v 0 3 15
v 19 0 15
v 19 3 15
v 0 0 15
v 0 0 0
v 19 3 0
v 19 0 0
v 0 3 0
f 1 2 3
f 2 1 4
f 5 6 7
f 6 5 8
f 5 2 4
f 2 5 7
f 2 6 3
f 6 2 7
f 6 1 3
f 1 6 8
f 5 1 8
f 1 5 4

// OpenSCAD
// Generated by SolidPython 1.0.1 on 2020-07-29 00:46:56


cube(size = [19, 3, 15]);
/***********************************************
*********      SolidPython code:      **********
************************************************
 
# import packages: SolidPython
from solid import *
from solid.utils import *
from itertools import chain, combinations, permutations


class Resize:

    def __init__(self, scad_file):
        self.scad_file = scad_file
        #self.scad_file = import_scad(scad_file)
        # cone/cylinder param:
        self.r1 = 0
        self.r2 = 0
        self.h = 0
        # rectangular prism param:
        self.w = 0
        self.l = 0
        # ellipse param:
        self.r = 0

    # import OpenScad code (file name corresponds to shape)


    # classify shape + parameters
    def assign(self, param1, param2, param3):
        if self.scad_file == 'cone.scad':
            self.r1 = param1
            self.r2 = param2
            self.h = param3
        elif self.scad_file == 'cylinder.scad':
            self.r1 = param1
            self.r2 = param2
            self.h = param3
        elif self.scad_file == 'rectangularPrism.scad':
            self.h = param1
            self.l = param2
            self.w = param3
        else:
            self.r = param1
            self.h = param2

    # resize parameters
    def iterate(self):
        x = range(3, 20, 2)
        i = 1
        if self.scad_file == 'cone.scad':
            tempList = list(permutations(x, 2))
            for temp in tempList:
                param1 = temp[0]
                param2 = temp[1]
                filepath = 'produced_scad_files/' + 'cone' + str(param1) + '_' + str(param2) + '_' + '.scad'
                scad_render_to_file(cylinder(h=param1, r1=param2, r2=0), filepath)

        elif self.scad_file == 'cylinder.scad':
            tempList = list(permutations(x, 3))
            for temp in tempList:
                param1 = temp[0]
                param2 = temp[1]
                filepath = 'produced_scad_files/' + 'cylinder' + str(param1) + '_' + str(param2) + '_' + '.scad'
                scad_render_to_file(cylinder(h=param1, r1=param2, r2=param2), filepath)

        elif self.scad_file == 'rectangularPrism.scad':
            tempList = list(permutations(x, 3))
            for temp in tempList:
                param1 = temp[0]
                param2 = temp[1]
                param3 = temp[2]
                filepath = 'produced_scad_files/' + 'rectangularPrism' + str(param1) + '_' + str(param2) + '_' + str(
                    param3) + '.scad'
                scad_render_to_file(cube(size=(param1, param2, param3)), filepath)

        elif self.scad_file == 'ellipse.scad':
            tempList = list(permutations(x, 4))
            for temp in tempList:
                param1 = temp[0]
                param2 = temp[1]
                param3 = temp[2]
                param4 = temp[3]
                filepath = 'produced_scad_files/' + 'ellipse' + str(param1) + '_' + str(param2) + '_' + str(param3) + '_' + str(param4) + '.scad'
                scad_render_to_file(scale([param1, param2, param3])(sphere(r=param4)), filepath)

    def render_to_scadfile(self):
        scad_render_to_file(scad, 'example.scad') 
 
************************************************/
